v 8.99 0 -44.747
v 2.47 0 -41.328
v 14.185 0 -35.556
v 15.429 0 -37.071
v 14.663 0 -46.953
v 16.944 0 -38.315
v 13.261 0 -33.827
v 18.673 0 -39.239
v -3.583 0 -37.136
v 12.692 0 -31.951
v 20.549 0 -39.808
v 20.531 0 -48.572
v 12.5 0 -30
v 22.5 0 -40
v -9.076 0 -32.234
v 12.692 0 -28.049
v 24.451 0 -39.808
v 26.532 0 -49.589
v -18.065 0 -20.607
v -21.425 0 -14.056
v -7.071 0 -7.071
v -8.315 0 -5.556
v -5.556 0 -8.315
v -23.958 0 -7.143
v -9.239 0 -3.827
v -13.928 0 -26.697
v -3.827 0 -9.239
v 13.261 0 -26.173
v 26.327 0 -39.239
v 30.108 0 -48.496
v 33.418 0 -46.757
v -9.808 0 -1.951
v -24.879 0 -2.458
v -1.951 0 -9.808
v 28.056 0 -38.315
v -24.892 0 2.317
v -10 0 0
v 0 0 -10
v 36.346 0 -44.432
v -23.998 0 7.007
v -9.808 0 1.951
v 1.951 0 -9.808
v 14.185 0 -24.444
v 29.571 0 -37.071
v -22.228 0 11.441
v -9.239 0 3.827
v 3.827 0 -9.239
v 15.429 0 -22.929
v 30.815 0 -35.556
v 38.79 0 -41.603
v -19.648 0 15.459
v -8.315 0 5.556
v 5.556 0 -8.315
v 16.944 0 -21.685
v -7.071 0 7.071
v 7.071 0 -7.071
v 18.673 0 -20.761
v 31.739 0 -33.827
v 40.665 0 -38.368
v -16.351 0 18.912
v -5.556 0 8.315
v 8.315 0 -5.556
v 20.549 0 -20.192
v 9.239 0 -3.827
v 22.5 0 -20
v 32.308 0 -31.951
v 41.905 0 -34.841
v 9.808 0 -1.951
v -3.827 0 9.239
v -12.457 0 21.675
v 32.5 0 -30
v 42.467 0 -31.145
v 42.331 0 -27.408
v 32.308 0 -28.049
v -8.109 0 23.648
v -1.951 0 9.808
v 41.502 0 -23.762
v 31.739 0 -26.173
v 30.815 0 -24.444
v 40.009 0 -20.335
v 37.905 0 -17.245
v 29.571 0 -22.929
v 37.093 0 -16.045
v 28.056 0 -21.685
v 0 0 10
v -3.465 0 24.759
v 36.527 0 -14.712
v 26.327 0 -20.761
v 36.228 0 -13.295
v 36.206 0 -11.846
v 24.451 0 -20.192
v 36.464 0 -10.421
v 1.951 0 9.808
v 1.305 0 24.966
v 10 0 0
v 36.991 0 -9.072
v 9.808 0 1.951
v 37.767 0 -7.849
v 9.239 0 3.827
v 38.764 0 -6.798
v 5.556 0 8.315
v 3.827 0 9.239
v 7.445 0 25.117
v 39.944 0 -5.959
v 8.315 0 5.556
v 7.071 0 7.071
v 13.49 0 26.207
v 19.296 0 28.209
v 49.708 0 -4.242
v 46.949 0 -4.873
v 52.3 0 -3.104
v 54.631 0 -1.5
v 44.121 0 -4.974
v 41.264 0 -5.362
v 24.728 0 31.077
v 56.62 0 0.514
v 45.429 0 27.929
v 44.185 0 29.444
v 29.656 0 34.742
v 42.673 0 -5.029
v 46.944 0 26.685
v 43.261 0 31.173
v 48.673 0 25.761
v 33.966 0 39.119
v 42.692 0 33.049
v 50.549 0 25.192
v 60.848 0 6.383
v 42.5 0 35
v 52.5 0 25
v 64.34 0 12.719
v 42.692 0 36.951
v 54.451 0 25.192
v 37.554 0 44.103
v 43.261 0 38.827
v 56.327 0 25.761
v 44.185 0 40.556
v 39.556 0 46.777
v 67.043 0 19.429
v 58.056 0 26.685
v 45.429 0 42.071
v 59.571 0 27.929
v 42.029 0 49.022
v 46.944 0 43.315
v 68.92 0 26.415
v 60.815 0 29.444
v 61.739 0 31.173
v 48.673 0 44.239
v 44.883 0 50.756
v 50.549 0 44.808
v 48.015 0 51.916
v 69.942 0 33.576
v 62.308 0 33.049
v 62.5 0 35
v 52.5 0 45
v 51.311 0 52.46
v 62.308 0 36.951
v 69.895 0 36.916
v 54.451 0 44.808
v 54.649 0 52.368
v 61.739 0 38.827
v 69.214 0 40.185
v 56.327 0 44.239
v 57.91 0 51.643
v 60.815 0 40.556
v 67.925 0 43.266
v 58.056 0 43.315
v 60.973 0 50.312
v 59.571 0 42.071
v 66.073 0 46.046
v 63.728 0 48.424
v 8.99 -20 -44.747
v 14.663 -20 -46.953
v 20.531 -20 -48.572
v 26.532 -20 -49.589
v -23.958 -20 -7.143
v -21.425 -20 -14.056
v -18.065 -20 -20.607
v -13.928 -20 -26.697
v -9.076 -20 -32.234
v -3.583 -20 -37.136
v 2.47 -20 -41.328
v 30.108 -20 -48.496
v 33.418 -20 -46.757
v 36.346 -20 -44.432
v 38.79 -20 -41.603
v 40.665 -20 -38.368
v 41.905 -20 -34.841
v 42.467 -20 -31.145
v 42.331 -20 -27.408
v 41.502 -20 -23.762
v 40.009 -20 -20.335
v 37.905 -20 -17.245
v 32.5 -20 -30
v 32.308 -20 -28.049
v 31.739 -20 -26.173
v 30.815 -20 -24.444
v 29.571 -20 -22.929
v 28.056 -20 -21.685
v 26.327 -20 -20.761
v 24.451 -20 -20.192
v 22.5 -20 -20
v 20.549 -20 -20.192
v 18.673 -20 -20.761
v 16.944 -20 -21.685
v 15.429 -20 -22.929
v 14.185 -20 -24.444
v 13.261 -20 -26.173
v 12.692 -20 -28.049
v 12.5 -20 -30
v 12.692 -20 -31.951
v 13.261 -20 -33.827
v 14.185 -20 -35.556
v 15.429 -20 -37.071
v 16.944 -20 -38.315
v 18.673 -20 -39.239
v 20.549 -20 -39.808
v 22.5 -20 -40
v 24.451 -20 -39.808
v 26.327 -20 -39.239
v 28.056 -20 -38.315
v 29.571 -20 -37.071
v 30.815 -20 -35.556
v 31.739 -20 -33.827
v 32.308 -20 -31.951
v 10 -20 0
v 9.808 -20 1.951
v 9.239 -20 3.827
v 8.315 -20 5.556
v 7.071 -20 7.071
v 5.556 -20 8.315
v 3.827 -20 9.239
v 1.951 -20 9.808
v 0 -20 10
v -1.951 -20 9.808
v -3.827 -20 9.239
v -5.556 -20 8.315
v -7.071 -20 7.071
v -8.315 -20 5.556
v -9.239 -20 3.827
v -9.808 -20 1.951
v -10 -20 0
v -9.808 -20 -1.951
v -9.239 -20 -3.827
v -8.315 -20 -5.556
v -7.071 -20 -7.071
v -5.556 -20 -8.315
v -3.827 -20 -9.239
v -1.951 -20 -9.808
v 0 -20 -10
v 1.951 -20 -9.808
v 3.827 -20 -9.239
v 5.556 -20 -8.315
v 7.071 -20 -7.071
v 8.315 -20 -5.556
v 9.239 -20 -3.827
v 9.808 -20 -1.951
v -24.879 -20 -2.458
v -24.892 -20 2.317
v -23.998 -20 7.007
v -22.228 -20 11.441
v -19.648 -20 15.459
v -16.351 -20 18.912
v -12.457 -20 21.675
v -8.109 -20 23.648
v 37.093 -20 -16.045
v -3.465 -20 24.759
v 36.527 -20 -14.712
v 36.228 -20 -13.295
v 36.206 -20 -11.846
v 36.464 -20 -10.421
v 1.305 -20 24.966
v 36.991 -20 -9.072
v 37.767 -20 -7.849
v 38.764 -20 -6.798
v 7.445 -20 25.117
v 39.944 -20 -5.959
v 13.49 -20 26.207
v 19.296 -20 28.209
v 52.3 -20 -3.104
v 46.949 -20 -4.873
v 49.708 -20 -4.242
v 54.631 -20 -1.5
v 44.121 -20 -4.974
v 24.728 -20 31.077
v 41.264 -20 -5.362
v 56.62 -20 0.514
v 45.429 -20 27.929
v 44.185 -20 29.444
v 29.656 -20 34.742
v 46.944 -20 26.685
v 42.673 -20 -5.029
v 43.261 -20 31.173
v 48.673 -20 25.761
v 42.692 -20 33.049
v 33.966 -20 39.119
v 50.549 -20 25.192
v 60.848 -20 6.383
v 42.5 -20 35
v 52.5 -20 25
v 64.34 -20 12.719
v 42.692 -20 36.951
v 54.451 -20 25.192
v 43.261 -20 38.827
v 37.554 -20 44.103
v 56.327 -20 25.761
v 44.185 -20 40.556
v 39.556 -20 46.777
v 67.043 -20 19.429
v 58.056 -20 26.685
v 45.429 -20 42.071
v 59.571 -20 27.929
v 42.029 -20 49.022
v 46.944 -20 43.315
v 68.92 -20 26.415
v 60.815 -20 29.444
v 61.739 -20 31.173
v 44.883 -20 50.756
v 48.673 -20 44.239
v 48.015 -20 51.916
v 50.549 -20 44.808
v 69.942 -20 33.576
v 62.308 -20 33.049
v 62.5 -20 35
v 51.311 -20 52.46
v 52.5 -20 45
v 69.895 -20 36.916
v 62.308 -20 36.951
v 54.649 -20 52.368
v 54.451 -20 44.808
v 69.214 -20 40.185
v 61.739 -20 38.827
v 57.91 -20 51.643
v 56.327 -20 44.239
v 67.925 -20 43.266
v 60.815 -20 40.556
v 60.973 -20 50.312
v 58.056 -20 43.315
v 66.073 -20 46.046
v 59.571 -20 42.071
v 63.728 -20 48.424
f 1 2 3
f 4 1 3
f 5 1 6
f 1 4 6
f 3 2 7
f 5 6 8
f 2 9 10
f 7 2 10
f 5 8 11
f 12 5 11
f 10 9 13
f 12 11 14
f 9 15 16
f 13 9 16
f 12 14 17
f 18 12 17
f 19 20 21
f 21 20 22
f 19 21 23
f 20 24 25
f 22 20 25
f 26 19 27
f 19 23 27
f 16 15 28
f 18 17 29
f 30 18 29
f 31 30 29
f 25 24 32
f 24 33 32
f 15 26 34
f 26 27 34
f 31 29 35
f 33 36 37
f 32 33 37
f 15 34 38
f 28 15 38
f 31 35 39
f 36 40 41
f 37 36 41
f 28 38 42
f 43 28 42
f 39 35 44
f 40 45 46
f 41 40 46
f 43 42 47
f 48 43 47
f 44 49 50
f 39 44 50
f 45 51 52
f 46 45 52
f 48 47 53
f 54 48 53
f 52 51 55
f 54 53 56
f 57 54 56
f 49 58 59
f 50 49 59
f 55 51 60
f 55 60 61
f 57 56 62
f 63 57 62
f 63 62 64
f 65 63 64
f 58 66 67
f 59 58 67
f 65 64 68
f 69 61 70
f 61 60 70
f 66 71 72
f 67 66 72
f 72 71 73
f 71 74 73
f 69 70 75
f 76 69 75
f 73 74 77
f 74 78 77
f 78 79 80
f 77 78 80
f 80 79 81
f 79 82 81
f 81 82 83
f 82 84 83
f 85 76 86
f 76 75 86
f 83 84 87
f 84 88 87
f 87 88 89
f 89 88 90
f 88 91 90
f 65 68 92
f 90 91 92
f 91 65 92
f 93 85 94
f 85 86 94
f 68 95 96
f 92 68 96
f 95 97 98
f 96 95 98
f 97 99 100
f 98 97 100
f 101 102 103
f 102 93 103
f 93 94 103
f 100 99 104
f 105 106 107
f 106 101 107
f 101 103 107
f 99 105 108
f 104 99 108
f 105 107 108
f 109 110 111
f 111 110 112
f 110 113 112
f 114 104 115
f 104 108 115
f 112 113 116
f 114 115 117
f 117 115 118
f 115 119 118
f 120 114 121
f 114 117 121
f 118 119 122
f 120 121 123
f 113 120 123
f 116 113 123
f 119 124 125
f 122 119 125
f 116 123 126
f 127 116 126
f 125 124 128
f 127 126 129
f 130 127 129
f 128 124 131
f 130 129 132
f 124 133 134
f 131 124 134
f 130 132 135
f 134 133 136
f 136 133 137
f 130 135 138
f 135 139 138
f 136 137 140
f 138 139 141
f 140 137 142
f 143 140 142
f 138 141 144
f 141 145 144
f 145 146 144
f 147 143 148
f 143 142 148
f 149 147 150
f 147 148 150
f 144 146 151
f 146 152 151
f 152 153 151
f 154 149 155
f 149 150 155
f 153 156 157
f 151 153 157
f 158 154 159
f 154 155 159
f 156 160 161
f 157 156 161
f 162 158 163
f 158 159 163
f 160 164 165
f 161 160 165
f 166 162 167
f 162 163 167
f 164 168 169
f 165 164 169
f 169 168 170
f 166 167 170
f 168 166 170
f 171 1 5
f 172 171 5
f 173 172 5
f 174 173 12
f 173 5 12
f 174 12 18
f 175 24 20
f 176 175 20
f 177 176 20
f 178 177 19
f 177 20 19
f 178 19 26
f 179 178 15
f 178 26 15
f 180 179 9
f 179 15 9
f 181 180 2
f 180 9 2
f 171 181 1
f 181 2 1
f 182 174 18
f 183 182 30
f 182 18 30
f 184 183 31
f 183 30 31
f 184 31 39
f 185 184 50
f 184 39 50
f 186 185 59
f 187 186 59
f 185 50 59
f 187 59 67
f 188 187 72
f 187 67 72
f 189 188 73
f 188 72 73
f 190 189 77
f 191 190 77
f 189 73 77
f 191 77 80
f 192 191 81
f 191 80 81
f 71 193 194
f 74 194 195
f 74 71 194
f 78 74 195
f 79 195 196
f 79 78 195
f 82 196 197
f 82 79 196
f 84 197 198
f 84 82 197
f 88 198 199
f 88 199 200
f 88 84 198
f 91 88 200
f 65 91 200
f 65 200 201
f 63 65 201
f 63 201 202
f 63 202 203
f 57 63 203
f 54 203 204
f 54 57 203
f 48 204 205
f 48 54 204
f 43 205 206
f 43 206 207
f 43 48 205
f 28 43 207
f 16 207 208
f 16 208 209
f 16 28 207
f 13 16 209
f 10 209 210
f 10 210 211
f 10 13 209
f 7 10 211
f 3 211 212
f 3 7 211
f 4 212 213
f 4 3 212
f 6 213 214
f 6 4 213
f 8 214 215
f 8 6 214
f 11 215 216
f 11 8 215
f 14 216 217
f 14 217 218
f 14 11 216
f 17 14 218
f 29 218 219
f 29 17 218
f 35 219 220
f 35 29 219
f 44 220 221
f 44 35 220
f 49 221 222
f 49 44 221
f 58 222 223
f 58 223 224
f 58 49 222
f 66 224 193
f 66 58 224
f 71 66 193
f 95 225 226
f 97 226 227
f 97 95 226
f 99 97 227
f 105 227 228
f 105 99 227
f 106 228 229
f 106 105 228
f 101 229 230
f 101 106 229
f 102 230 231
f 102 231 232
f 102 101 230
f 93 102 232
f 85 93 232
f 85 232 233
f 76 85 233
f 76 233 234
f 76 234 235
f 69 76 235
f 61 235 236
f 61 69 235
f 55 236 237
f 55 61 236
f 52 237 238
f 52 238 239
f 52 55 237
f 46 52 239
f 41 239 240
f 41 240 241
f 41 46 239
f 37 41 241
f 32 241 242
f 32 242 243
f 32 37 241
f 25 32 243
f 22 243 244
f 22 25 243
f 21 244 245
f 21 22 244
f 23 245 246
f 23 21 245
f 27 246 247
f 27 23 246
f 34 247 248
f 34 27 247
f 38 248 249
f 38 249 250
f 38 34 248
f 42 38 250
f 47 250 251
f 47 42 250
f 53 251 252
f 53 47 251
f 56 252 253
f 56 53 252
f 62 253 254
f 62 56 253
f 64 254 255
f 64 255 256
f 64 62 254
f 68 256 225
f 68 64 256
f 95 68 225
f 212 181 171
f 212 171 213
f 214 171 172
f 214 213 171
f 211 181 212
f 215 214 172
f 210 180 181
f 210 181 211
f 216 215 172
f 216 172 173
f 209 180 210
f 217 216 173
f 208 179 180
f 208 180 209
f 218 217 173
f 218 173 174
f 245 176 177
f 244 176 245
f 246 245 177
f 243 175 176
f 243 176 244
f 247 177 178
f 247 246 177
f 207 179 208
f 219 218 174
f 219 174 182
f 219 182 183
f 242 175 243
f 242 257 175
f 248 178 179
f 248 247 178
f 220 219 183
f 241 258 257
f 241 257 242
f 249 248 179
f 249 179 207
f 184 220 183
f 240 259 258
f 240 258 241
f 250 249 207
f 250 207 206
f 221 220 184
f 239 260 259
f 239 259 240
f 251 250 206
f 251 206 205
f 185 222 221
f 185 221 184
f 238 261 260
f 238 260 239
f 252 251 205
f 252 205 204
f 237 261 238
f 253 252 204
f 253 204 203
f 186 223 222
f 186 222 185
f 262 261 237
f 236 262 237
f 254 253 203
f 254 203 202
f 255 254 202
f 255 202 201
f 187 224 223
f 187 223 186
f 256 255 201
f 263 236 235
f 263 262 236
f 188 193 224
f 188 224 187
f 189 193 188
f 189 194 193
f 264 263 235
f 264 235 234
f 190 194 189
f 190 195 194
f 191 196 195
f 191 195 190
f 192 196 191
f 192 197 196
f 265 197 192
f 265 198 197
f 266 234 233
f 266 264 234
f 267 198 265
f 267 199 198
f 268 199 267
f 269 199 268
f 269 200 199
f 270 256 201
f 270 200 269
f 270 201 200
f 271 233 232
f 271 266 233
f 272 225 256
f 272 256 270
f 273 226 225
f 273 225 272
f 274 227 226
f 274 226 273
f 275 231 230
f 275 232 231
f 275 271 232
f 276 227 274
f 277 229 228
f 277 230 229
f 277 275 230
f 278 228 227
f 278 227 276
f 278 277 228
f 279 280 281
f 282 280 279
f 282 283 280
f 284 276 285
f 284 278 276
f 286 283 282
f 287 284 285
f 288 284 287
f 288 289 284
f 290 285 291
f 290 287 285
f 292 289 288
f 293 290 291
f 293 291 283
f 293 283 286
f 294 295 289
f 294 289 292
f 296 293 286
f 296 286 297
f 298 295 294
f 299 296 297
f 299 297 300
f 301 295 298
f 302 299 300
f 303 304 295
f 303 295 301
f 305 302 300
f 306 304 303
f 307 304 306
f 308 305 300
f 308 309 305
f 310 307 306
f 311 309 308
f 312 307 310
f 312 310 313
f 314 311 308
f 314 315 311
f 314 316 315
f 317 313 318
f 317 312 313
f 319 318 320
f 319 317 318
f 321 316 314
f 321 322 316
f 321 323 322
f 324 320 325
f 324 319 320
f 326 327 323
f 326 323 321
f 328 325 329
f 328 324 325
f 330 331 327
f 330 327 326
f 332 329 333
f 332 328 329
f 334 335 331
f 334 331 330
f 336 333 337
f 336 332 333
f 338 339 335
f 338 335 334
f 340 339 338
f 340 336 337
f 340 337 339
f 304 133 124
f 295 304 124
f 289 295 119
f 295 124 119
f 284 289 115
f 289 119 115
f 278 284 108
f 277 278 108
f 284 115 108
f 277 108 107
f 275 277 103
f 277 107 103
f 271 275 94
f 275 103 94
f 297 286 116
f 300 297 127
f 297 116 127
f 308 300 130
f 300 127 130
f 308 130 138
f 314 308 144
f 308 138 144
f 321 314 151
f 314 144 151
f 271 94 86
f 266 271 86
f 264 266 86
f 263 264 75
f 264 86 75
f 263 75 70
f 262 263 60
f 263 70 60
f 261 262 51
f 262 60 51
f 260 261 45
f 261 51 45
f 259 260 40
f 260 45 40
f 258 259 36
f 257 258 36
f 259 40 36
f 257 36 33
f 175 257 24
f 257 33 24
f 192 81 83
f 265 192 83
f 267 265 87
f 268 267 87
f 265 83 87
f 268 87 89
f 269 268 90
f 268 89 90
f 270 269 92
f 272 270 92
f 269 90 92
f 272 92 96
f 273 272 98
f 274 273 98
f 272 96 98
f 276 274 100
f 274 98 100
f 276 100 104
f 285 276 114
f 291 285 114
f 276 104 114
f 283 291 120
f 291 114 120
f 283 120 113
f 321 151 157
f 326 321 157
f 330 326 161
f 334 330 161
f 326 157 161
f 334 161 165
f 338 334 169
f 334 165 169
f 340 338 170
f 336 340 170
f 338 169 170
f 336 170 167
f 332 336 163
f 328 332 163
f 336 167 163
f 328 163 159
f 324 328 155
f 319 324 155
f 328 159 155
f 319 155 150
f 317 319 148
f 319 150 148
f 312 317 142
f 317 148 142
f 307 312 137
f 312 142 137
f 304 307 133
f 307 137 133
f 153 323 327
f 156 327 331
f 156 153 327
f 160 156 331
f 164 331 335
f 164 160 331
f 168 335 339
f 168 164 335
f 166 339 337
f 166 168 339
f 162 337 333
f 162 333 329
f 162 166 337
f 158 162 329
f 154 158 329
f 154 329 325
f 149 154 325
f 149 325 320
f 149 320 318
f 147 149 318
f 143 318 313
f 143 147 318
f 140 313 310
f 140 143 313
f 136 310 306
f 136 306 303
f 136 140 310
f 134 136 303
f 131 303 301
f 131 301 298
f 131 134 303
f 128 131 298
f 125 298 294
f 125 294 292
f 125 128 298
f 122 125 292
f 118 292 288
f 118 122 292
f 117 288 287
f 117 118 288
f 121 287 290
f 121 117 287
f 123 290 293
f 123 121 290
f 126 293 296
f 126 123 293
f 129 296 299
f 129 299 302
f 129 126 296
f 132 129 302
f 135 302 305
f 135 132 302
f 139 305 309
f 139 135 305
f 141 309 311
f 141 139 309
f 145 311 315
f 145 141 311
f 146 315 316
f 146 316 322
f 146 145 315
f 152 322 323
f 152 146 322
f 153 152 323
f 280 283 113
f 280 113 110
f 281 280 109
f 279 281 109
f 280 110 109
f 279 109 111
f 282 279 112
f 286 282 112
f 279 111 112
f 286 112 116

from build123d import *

# Parameters (mm, degrees)
F0_R     = 10
F1_DEPTH = 20


with BuildPart() as f1:
    # F0 (on Front) → F1 (new body)
    with BuildSketch(Plane.XZ):
        with BuildLine():
            ThreePointArc((37.554206, 44.103474), (22.067235, 29.538399), (1.304766, 24.965929))
            ThreePointArc((1.304766, 24.965929), (-19.647756, 15.458515), (-23.957871, -7.142857))
            ThreePointArc((-23.957871, -7.142857), (-11.587381, -29.540201), (8.989835, -44.747049))
            ThreePointArc((8.989835, -44.747049), (17.576496, -47.837133), (26.532468, -49.589262))
            ThreePointArc((26.532468, -49.589262), (41.367793, -36.63373), (37.904534, -17.244596))
            ThreePointArc((37.904534, -17.244596), (36.990811, -9.071889), (44.120823, -4.974213))
            ThreePointArc((44.120823, -4.974213), (51.030762, -3.734261), (56.619703, 0.514089))
            ThreePointArc((56.619703, 0.514089), (65.792763, 16.032989), (69.941986, 33.576228))
            ThreePointArc((69.941986, 33.576228), (57.909572, 51.642912), (37.554206, 44.103474))
        make_face()
        Circle(F0_R, mode=Mode.SUBTRACT)
        with Locations((22.5, -30)):
            Circle(F0_R, mode=Mode.SUBTRACT)
        with Locations((52.5, 35)):
            Circle(F0_R, mode=Mode.SUBTRACT)
    extrude(amount=F1_DEPTH)


solid = f1.part
